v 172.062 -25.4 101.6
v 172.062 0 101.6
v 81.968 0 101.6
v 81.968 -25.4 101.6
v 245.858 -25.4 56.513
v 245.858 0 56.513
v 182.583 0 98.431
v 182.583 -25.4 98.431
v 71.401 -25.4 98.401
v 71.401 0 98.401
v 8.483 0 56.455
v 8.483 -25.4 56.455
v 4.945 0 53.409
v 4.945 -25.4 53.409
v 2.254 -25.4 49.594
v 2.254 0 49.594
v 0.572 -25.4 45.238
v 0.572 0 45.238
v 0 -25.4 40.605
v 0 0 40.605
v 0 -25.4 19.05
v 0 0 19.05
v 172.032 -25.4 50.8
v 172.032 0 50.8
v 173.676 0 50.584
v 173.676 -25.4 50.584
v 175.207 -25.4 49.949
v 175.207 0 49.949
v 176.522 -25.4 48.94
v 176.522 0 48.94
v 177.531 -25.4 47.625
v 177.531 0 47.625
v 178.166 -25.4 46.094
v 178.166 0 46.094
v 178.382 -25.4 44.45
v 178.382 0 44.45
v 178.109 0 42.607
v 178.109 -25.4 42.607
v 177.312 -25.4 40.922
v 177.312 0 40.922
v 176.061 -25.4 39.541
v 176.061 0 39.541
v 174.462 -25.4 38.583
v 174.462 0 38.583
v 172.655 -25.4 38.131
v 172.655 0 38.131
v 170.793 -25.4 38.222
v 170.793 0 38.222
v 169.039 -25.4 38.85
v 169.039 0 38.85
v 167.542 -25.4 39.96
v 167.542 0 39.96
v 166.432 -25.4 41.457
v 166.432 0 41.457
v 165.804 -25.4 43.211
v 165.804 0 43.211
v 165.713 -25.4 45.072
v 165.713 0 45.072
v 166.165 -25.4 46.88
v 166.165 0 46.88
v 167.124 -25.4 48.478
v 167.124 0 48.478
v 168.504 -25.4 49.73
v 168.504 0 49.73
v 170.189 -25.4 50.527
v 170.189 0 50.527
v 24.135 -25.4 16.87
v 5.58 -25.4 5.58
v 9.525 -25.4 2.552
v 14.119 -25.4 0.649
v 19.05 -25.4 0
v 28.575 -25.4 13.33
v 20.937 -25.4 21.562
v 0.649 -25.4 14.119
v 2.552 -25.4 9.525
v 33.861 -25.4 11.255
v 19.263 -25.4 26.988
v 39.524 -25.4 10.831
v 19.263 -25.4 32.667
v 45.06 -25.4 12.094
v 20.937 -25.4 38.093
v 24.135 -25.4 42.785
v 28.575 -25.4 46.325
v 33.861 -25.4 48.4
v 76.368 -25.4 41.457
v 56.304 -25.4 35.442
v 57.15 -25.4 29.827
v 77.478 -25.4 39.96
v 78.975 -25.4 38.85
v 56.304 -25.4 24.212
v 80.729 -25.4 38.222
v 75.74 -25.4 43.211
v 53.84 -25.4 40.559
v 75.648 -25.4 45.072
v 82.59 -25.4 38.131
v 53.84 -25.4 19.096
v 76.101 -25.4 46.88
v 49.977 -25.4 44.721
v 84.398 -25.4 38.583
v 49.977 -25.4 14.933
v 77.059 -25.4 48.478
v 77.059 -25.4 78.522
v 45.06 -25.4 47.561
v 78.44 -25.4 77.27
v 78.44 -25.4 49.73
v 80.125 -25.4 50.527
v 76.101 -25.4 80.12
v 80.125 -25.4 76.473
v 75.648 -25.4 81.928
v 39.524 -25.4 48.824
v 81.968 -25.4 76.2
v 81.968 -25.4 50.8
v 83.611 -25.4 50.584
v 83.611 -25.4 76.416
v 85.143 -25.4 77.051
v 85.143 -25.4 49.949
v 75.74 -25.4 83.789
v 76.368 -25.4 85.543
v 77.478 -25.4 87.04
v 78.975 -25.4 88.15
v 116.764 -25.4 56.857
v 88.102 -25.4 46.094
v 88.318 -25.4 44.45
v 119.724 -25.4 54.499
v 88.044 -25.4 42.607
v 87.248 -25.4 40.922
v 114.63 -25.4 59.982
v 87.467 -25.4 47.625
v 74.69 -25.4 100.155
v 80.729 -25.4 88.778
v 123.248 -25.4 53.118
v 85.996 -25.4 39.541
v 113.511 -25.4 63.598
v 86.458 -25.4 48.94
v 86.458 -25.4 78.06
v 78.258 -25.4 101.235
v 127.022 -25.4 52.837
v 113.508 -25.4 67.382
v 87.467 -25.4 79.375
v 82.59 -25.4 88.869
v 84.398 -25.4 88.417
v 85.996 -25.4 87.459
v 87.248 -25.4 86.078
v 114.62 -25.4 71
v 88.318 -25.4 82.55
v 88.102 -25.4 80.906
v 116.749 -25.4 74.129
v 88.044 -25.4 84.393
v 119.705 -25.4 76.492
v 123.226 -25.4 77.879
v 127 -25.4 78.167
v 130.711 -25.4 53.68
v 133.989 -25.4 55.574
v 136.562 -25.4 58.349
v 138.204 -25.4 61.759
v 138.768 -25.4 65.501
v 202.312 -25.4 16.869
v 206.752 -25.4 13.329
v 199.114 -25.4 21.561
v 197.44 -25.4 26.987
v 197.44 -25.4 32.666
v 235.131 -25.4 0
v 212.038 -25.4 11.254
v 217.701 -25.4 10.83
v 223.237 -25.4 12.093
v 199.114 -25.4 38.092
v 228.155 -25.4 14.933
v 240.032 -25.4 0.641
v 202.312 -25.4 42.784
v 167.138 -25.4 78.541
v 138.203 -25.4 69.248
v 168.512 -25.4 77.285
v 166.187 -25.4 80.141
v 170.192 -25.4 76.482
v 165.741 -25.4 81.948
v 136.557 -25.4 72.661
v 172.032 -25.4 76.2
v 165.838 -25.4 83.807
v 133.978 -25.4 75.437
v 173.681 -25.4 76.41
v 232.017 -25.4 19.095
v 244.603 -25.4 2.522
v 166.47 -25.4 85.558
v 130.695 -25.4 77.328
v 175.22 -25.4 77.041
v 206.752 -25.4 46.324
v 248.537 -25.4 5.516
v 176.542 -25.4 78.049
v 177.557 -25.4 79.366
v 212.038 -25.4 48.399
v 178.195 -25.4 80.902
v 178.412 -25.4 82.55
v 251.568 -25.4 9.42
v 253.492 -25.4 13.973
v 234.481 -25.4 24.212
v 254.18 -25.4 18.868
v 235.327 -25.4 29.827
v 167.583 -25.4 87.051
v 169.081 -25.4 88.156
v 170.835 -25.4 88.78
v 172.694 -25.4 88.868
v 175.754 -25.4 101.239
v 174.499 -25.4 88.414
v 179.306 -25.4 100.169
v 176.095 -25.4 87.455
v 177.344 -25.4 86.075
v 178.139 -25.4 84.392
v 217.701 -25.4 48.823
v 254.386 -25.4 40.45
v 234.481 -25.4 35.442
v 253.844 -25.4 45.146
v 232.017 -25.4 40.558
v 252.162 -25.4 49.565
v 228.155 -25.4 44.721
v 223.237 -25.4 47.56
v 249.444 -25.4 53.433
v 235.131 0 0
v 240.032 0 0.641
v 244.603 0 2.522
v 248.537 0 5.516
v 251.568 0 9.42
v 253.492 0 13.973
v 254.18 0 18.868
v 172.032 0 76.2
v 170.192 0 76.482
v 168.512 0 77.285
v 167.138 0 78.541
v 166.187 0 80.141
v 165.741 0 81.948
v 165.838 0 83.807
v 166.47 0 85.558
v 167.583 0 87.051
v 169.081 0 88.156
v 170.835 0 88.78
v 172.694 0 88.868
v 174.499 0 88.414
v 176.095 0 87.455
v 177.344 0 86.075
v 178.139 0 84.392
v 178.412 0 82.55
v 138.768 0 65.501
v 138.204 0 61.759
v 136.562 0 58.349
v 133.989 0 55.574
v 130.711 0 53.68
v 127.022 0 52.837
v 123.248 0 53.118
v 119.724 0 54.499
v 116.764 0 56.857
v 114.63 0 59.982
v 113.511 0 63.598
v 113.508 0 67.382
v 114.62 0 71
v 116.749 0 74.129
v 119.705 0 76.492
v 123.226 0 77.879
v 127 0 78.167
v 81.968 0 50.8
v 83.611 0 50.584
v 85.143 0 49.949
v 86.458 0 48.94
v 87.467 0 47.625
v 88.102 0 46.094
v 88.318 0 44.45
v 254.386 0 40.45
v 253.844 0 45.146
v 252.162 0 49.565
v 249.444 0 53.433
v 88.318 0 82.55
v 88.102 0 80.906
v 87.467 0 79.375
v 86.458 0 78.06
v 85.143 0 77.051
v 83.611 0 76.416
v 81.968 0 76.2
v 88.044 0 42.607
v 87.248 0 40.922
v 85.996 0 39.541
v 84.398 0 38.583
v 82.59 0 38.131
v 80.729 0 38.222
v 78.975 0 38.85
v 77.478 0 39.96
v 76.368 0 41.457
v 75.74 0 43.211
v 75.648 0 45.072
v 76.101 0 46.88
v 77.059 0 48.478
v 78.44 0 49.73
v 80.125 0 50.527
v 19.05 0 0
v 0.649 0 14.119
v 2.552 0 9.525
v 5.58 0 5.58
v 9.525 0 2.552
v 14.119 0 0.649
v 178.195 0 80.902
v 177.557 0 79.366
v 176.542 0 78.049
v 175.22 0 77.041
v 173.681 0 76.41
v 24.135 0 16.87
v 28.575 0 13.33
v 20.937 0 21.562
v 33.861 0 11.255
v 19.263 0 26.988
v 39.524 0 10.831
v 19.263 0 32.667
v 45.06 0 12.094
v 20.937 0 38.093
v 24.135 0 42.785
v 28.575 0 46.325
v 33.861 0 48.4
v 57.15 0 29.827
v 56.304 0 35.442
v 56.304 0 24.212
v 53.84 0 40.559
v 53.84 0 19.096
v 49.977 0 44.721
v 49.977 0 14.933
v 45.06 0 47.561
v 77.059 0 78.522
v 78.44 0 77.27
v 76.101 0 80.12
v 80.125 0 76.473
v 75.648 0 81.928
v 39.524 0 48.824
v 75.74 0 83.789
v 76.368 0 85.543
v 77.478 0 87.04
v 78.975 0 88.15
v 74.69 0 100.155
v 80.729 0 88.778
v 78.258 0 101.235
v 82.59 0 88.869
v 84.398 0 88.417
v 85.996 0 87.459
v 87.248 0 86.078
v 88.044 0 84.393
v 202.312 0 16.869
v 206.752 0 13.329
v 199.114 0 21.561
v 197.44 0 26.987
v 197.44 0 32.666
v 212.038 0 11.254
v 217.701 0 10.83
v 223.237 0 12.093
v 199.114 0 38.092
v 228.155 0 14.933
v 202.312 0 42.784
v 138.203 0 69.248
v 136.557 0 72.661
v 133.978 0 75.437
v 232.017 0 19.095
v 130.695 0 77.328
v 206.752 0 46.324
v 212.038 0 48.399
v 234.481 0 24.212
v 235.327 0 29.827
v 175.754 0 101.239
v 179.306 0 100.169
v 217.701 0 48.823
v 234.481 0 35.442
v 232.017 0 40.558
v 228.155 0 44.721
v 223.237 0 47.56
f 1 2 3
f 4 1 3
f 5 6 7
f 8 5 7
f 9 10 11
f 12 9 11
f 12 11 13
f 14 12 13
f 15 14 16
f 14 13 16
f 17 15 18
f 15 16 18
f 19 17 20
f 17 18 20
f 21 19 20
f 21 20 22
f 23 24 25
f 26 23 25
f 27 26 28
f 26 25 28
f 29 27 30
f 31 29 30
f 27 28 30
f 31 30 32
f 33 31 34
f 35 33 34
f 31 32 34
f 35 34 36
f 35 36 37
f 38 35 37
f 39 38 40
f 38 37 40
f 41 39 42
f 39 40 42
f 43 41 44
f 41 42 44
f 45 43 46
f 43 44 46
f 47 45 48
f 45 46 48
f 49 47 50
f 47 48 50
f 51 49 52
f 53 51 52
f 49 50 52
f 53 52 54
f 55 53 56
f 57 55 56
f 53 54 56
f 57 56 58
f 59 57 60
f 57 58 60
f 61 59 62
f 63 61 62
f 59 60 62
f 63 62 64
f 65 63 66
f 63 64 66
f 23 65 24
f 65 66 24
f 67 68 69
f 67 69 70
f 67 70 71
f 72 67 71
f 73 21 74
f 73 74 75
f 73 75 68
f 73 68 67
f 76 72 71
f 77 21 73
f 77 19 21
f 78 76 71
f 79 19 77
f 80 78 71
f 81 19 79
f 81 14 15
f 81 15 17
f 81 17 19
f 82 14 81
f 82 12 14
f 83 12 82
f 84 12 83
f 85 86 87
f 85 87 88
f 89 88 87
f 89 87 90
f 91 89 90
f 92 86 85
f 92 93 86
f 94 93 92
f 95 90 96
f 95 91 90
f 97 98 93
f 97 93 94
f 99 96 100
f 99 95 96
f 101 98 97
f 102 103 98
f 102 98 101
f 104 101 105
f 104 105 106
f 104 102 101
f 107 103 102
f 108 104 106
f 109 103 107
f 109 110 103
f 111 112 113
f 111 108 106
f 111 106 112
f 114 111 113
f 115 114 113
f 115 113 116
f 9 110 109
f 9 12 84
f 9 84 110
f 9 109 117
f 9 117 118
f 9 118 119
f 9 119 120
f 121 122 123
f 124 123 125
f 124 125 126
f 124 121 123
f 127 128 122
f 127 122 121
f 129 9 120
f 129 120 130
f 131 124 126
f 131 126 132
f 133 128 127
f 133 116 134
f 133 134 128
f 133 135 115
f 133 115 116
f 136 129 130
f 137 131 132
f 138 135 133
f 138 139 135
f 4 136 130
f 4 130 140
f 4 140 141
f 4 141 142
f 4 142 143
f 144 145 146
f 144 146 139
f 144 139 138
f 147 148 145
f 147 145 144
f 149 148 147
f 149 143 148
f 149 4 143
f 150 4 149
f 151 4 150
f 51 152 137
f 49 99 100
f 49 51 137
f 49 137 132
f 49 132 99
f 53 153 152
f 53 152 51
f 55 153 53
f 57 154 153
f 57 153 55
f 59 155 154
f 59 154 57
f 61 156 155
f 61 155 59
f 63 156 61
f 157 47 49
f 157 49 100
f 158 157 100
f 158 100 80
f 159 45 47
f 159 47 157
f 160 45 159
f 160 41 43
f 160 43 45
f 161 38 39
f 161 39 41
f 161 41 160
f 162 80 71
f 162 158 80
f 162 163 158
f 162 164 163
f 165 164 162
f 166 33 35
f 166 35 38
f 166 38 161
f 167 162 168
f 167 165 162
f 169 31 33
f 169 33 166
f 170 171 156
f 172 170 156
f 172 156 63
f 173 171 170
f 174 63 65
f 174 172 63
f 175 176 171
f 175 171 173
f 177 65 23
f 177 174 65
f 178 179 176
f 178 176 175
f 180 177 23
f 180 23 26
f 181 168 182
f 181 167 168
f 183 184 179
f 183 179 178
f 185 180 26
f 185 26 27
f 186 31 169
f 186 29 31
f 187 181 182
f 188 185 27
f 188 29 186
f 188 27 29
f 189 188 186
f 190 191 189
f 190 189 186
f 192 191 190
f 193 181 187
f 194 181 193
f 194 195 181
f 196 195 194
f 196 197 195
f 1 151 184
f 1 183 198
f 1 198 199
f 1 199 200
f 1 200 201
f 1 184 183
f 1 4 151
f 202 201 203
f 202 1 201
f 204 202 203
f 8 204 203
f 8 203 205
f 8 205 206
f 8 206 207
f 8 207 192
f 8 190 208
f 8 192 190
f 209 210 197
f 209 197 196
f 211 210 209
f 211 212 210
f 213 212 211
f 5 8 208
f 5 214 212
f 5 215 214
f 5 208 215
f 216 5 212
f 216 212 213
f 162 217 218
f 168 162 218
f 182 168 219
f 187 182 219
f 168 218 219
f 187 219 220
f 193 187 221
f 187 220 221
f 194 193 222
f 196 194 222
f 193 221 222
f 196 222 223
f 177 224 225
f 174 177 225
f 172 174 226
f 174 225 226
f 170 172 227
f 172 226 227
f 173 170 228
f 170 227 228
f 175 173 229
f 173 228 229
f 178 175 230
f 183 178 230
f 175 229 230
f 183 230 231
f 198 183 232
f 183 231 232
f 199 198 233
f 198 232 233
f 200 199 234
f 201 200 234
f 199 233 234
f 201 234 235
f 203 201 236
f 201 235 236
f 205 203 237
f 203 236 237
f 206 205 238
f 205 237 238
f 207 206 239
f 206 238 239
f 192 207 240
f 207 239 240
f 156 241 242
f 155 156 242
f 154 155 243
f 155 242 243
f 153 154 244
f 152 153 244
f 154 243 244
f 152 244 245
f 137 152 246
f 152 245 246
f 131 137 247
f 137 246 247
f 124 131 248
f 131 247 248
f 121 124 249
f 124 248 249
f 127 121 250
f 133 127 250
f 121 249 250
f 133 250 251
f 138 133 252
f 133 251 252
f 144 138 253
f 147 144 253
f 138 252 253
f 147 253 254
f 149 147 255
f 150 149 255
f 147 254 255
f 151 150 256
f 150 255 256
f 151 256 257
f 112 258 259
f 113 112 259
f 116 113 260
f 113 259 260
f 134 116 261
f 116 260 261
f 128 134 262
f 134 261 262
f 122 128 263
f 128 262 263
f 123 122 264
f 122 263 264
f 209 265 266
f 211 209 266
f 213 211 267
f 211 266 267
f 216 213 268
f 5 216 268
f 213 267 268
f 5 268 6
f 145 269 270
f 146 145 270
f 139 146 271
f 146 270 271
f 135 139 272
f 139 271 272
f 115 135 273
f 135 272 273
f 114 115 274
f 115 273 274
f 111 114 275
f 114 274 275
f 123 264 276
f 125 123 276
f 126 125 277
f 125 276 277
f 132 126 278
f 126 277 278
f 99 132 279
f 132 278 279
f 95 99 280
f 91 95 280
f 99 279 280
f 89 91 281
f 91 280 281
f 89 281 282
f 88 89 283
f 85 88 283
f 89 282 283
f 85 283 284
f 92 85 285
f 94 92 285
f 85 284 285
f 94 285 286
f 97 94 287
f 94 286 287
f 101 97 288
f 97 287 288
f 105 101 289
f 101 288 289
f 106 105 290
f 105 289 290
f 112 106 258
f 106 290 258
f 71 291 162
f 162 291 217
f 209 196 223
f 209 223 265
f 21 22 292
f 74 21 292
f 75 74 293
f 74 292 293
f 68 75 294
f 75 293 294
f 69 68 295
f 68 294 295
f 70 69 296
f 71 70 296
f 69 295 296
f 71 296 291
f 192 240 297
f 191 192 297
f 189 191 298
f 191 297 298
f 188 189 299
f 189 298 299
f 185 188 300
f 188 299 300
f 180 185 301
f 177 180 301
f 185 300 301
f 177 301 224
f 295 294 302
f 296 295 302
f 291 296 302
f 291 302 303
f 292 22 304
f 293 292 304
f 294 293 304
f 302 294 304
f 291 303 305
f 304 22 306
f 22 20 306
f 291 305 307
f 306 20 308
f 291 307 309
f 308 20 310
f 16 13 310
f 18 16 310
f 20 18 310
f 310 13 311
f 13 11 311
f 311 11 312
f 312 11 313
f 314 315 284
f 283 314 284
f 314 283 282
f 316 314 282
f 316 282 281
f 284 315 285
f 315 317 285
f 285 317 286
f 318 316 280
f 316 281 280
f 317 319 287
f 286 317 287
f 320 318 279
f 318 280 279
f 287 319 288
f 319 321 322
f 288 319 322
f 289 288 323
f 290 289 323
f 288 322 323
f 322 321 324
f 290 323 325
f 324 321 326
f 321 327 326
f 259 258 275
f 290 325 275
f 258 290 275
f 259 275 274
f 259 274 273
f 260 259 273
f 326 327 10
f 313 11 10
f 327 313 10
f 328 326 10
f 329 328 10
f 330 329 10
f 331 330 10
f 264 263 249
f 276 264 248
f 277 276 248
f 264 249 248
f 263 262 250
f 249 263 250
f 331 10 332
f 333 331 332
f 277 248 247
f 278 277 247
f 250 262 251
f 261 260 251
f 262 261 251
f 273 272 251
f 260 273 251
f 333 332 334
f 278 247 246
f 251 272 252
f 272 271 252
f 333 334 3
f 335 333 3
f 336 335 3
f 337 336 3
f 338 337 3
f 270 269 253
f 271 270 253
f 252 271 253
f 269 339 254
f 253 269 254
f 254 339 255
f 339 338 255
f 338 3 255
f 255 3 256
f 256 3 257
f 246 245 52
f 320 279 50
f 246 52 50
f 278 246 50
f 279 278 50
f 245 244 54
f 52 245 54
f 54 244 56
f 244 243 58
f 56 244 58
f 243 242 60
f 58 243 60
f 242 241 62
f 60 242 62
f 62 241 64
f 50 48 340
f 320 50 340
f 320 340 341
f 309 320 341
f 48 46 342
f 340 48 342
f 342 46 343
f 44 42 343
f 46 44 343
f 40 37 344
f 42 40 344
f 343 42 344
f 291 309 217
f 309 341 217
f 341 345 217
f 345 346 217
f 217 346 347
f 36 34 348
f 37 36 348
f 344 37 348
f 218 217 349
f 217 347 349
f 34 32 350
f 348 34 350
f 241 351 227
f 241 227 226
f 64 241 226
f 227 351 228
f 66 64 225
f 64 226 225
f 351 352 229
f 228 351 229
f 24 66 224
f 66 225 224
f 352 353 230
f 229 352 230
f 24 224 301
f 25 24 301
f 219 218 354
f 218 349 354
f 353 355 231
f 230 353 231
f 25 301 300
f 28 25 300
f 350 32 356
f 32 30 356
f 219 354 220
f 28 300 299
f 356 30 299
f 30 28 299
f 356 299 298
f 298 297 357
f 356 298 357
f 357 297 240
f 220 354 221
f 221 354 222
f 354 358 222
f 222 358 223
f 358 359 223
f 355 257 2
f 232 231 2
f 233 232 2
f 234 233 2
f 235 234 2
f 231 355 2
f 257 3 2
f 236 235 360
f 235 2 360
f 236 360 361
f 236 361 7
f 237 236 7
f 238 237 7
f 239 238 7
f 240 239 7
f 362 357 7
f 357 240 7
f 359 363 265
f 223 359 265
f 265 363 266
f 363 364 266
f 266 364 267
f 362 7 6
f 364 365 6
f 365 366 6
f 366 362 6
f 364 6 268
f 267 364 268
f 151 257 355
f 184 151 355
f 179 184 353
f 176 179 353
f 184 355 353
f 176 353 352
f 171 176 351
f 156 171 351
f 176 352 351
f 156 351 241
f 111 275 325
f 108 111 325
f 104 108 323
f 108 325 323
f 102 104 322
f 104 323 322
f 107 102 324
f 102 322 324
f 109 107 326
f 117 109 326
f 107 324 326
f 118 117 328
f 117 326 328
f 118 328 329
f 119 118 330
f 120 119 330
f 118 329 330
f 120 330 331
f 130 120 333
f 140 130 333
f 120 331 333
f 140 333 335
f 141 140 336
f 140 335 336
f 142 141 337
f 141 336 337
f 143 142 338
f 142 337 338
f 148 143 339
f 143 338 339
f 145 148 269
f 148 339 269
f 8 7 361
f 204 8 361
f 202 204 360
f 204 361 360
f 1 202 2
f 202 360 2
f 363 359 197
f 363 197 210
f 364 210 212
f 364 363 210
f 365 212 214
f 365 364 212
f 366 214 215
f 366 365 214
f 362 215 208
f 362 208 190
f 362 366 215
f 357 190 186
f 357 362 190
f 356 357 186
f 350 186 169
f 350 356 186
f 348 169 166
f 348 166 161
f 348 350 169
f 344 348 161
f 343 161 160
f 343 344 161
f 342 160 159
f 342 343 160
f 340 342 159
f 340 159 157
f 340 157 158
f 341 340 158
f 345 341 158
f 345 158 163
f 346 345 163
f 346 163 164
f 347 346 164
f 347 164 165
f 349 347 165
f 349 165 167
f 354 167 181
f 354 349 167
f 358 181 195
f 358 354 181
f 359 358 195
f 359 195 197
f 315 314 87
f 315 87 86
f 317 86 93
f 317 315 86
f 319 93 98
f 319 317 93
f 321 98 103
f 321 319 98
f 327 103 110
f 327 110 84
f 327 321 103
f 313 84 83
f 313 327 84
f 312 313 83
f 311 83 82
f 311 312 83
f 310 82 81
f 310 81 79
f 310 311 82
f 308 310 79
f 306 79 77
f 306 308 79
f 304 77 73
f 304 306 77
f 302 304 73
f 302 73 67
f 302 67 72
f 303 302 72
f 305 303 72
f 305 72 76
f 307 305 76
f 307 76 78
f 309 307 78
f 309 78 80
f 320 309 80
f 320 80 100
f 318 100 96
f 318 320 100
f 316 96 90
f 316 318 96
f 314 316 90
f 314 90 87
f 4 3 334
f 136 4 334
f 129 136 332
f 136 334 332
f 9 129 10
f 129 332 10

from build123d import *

# Parameters (mm, degrees)
F1_R     = 19.05
F2_DEPTH = 25.4


with BuildPart() as f2:
    # F1 (on Front) → F2 (new body)
    with BuildSketch(Plane.XZ):
        with BuildLine():
            ThreePointArc((0, 19.05), (5.579616, 5.579616), (19.05, 0))
            Line((19.05, 0), (235.130832, 0))
            ThreePointArc((235.130832, 0), (248.536825, 5.515531), (254.179965, 18.86831))
            Line((254.179965, 18.86831), (254.385811, 40.449988))
            ThreePointArc((254.385811, 40.449988), (252.162315, 49.564786), (245.857692, 56.512822))
            Line((245.857692, 56.512822), (182.583289, 98.431144))
            ThreePointArc((182.583289, 98.431144), (177.556212, 100.790591), (172.062274, 101.6))
            Line((172.062274, 101.6), (127, 101.6))
            Line((127, 101.6), (81.967876, 101.6))
            ThreePointArc((81.967876, 101.6), (76.447488, 100.782603), (71.400837, 98.400558))
            Line((71.400837, 98.400558), (8.482961, 56.455308))
            ThreePointArc((8.482961, 56.455308), (2.254099, 49.593643), (0, 40.604749))
            Line((0, 40.604749), (0, 19.05))
        make_face()
        with Locations((38.1, 29.827375)):
            Circle(F1_R, mode=Mode.SUBTRACT)
        with BuildLine():
            ThreePointArc((88.317876, 44.45), (77.477748, 39.959872), (81.967876, 50.8))
            ThreePointArc((81.967876, 50.8), (86.458004, 48.940128), (88.317876, 44.45))
        make_face(mode=Mode.SUBTRACT)
        with BuildLine():
            ThreePointArc((178.382124, 44.45), (167.541996, 39.959872), (172.032124, 50.8))
            ThreePointArc((172.032124, 50.8), (176.522252, 48.940128), (178.382124, 44.45))
        make_face(mode=Mode.SUBTRACT)
        with Locations((216.277108, 29.826619)):
            Circle(F1_R, mode=Mode.SUBTRACT)
        with BuildLine():
            ThreePointArc((138.767743, 65.500937), (116.76372, 56.856565), (127, 78.166675))
            ThreePointArc((127, 78.166675), (135.371765, 74.145309), (138.767743, 65.500937))
        make_face(mode=Mode.SUBTRACT)
        with BuildLine():
            ThreePointArc((88.317876, 82.55), (86.458004, 78.059872), (81.967876, 76.2))
            ThreePointArc((81.967876, 76.2), (77.477748, 87.040128), (88.317876, 82.55))
        make_face(mode=Mode.SUBTRACT)
        with BuildLine():
            ThreePointArc((178.412274, 82.55), (176.54173, 78.049225), (172.032124, 76.200072))
            ThreePointArc((172.032124, 76.200072), (167.582818, 87.050775), (178.412274, 82.55))
        make_face(mode=Mode.SUBTRACT)
    extrude(amount=F2_DEPTH)


solid = f2.part
